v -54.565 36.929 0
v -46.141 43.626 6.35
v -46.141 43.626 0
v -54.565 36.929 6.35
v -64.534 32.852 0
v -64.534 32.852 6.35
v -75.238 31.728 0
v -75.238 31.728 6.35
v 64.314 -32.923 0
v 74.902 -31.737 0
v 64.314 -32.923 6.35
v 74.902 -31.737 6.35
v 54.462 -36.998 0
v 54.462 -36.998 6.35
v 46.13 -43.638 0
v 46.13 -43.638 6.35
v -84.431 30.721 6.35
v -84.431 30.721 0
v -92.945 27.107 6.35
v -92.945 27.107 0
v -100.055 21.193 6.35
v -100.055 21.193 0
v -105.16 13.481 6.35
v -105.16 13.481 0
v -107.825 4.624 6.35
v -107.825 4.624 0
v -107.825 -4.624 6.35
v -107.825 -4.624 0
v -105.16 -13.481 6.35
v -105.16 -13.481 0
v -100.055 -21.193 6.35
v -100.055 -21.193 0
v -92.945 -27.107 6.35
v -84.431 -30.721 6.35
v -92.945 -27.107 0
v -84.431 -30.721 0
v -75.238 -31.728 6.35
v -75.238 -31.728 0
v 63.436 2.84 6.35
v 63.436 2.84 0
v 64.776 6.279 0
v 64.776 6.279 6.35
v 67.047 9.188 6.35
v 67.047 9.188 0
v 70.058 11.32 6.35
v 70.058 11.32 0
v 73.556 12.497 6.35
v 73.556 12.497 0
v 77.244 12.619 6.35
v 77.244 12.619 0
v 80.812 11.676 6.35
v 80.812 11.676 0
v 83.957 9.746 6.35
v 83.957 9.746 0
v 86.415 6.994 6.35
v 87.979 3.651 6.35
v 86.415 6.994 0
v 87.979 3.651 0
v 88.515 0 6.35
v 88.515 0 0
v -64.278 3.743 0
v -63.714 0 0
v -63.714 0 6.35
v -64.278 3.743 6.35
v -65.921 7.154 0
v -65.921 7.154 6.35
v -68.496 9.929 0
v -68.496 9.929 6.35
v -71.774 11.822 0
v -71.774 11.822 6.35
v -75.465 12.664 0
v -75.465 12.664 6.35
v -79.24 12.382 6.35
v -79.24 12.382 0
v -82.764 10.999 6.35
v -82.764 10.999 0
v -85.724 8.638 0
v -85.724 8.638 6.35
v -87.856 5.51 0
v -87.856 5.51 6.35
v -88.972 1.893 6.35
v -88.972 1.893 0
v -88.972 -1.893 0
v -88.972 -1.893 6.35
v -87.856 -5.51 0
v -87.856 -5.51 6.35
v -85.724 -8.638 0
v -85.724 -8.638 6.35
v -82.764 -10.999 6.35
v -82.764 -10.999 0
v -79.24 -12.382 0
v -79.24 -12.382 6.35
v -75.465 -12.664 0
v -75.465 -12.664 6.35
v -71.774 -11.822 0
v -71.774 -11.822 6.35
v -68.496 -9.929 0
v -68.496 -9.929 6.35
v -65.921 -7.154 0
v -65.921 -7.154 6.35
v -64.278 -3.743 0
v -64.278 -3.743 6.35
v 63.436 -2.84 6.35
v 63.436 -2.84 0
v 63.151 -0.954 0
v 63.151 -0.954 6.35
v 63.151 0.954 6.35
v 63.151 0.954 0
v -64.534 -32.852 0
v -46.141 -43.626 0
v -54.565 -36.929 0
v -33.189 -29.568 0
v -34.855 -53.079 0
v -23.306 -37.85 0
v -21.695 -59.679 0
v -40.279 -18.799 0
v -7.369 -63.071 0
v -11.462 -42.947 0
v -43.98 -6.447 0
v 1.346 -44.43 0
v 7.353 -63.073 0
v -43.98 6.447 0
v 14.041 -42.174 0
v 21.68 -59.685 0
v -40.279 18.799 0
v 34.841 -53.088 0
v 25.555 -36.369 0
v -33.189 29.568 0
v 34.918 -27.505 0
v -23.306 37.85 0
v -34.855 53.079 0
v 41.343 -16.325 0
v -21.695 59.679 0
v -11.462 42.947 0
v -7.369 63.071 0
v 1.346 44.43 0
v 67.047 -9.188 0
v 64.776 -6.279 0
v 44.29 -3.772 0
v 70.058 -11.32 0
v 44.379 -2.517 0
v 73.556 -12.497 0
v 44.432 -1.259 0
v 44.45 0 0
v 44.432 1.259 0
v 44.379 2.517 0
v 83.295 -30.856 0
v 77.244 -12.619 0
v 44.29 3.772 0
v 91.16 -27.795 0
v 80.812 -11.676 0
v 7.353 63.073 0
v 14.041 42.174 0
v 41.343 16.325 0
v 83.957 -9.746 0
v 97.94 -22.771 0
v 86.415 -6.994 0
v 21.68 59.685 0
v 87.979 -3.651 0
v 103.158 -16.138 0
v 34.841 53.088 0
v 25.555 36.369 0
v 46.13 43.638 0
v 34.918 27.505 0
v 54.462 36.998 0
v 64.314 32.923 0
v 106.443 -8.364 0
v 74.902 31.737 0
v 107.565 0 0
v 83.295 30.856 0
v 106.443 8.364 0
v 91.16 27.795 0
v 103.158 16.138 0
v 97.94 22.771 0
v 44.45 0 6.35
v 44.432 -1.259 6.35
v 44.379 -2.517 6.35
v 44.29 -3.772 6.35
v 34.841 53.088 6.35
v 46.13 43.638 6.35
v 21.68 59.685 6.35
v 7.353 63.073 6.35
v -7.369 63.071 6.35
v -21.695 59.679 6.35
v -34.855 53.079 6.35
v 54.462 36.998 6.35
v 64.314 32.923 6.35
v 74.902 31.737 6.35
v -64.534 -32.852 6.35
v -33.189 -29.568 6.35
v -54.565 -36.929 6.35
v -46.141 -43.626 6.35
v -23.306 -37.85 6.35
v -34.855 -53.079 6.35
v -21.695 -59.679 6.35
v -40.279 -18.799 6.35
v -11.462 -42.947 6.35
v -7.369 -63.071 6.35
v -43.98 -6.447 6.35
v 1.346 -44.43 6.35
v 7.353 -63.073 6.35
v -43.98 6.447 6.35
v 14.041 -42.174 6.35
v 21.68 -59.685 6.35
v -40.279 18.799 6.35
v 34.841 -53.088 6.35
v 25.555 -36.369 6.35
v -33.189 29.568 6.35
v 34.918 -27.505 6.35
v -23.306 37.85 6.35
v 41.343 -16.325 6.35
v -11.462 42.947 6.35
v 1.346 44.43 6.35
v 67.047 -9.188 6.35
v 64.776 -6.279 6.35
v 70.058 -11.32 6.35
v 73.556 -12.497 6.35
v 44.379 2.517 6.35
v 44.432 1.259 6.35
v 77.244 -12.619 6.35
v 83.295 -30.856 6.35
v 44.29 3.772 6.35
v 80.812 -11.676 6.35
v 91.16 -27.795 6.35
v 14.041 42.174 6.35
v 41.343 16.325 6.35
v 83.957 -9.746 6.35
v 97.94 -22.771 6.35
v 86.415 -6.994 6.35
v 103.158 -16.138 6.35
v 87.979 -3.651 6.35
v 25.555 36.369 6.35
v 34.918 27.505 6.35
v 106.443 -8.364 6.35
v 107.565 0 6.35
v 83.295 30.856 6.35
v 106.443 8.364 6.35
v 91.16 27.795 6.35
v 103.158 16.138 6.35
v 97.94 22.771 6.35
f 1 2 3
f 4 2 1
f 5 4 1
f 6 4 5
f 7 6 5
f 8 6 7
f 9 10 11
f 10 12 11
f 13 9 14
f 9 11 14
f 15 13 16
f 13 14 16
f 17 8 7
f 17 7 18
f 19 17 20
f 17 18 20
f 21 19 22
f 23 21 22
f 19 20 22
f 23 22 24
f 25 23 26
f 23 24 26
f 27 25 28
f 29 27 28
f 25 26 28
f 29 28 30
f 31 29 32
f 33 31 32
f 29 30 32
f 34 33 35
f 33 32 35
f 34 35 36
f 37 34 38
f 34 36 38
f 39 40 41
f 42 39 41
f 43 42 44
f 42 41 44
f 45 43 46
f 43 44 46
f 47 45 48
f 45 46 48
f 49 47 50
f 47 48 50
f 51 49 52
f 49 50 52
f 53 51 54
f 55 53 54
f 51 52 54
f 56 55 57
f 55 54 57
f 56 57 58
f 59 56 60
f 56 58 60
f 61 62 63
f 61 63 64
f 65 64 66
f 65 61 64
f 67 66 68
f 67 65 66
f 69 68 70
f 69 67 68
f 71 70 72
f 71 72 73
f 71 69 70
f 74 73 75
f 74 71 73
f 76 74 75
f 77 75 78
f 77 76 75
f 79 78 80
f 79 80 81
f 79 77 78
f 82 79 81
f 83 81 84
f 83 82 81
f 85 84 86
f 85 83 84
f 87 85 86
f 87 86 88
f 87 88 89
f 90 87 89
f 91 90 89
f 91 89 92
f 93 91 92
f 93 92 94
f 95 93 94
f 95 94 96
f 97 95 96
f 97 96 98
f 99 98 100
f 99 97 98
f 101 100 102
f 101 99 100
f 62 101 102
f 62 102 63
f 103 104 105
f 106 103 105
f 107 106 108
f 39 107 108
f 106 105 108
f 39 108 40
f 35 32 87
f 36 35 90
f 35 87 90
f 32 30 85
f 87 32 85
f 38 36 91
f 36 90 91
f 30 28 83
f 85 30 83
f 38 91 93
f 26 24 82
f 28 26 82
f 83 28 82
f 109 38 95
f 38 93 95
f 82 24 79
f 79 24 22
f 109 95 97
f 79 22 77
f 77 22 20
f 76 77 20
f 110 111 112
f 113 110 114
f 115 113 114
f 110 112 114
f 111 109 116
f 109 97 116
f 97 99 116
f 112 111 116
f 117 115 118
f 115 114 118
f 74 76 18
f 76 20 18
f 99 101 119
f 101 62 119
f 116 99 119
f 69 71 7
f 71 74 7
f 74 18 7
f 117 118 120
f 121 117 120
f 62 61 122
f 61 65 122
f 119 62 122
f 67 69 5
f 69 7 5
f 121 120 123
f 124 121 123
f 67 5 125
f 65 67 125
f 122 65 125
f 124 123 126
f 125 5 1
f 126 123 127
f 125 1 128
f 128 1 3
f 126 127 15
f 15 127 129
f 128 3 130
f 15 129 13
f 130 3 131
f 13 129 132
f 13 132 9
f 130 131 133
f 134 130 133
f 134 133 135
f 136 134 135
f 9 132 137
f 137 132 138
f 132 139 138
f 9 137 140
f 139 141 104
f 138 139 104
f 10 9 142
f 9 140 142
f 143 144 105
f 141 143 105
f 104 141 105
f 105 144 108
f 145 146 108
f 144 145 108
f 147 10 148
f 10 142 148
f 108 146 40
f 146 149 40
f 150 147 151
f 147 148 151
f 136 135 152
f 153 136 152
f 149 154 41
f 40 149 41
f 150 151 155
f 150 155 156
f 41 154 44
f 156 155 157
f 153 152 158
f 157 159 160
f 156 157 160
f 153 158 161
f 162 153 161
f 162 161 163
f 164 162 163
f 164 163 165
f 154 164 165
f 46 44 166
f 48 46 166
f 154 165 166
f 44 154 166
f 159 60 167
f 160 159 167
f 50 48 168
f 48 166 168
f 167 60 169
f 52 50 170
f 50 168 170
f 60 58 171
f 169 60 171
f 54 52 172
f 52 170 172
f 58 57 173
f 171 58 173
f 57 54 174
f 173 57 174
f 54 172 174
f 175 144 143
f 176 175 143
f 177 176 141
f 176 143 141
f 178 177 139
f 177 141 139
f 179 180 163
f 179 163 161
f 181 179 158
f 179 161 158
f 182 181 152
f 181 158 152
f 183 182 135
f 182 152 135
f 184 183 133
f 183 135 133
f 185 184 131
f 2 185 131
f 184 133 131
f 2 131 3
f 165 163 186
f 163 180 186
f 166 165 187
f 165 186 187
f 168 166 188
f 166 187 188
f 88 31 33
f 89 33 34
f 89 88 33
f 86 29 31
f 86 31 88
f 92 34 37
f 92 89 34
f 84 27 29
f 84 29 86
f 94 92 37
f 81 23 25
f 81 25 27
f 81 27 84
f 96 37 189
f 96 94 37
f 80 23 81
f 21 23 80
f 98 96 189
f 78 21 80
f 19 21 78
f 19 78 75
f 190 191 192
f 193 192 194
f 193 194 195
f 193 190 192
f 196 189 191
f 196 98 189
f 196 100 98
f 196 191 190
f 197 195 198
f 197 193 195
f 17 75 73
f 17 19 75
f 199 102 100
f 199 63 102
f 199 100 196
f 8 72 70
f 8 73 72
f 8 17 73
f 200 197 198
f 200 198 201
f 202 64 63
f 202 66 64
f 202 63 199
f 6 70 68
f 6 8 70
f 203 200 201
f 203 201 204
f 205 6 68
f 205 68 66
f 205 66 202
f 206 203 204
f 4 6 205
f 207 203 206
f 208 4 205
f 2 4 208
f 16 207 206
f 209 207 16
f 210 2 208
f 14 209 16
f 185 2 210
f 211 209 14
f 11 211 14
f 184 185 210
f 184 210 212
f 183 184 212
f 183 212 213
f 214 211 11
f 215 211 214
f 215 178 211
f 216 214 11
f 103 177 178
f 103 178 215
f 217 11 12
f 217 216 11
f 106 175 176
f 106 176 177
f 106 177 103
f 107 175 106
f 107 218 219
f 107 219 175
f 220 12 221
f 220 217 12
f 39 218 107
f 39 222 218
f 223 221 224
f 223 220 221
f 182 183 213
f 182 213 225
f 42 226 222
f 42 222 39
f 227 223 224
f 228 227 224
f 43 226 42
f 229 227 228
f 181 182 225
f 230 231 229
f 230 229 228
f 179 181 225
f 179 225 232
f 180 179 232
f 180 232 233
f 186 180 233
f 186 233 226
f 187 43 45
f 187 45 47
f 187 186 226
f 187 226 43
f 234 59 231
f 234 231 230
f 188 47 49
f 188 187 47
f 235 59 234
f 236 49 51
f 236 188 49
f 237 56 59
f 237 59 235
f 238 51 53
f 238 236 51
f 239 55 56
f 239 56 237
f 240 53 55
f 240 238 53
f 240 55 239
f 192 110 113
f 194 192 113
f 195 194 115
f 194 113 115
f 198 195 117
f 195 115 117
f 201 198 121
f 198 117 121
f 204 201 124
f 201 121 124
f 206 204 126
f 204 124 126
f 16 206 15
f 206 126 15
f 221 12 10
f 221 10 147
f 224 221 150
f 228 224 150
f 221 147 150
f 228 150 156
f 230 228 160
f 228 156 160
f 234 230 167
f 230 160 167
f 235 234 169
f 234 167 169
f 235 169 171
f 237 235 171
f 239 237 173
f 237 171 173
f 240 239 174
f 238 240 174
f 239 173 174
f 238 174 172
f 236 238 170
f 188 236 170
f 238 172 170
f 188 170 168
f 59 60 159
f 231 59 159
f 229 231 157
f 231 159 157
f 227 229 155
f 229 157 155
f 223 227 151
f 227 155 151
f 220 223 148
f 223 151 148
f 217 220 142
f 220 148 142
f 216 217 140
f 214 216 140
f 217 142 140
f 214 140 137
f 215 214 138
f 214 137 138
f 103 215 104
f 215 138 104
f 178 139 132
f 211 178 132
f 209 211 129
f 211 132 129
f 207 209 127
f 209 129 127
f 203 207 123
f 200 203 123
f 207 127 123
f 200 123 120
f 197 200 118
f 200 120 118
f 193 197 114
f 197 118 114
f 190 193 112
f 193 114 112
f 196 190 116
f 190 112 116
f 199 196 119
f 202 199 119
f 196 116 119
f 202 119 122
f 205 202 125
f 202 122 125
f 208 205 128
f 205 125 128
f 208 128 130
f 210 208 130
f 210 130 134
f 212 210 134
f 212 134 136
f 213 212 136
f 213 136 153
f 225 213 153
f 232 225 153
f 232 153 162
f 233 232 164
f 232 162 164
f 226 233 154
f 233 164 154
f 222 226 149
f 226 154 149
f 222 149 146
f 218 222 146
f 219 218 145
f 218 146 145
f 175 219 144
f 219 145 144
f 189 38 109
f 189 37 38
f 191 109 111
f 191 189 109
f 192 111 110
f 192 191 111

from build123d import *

# Parameters (mm, degrees)
F0_R     = 12.7
F1_DEPTH = 6.35
F2_R     = 38.1


# Not quite as in the source:
# - a length typed as a fraction of an inch, garbled in the dataset ("3 / 203.2 mm" for 3/8 in), is restored


with BuildPart() as f1:
    # F0 (on Top) → F1 (new body)
    with BuildSketch(Plane.XY):
        with BuildLine():
            ThreePointArc((44.2896283804, 3.7724419046), (44.4098889973, 1.8879245867), (44.45, 0))
            ThreePointArc((44.45, 0), (44.4098889973, -1.8879245867), (44.2896283804, -3.7724419046))
            ThreePointArc((44.2896283804, -3.7724419046), (48.6524538165, -16.4400117074), (57.8519523886, -26.1801757984))
            ThreePointArc((57.8519523886, -26.1801757983), (61.7568132692, -14.7765359551), (63.4364387448, -2.8404646402))
            ThreePointArc((63.4364387448, -2.8404646402), (63.1147165179, 0), (63.4364387448, 2.8404646402))
            ThreePointArc((63.4364387448, 2.8404646402), (61.7568132692, 14.7765359551), (57.8519523886, 26.1801757983))
            ThreePointArc((57.8519523886, 26.1801757984), (48.6524538165, 16.4400117074), (44.2896283804, 3.7724419046))
        make_face()
        with BuildLine():
            ThreePointArc((44.2896283804, -3.7724419046), (-44.45, 0), (44.2896283804, 3.7724419046))
            ThreePointArc((44.2896283804, 3.7724419046), (48.6524538165, 16.4400117074), (57.8519523886, 26.1801757984))
            ThreePointArc((57.8519523886, 26.1801757983), (-0.1747733497, 63.499759482), (-57.9951886366, 25.8613243088))
            ThreePointArc((-57.9951886366, 25.8613243088), (-48.1929456979, 14.5475718573), (-44.6640486717, 0))
            ThreePointArc((-44.6640486717, 0), (-48.1929456979, -14.5475718573), (-57.9951886366, -25.8613243088))
            ThreePointArc((-57.9951886366, -25.8613243088), (-0.1747733497, -63.499759482), (57.8519523886, -26.1801757983))
            ThreePointArc((57.8519523886, -26.1801757984), (48.6524538165, -16.4400117074), (44.2896283804, -3.7724419046))
        make_face()
        with BuildLine():
            ThreePointArc((107.5647165179, 0), (90.6090522396, 28.09252802), (57.8519523886, 26.1801757984))
            ThreePointArc((57.8519523886, 26.1801757983), (61.7568132692, 14.7765359551), (63.4364387448, 2.8404646402))
            ThreePointArc((63.4364387448, 2.8404646402), (77.244029689, 12.6193131294), (88.5147165179, 0))
            ThreePointArc((88.5147165179, 0), (77.244029689, -12.6193131294), (63.4364387448, -2.8404646402))
            ThreePointArc((63.4364387448, -2.8404646402), (61.7568132692, -14.7765359551), (57.8519523886, -26.1801757983))
            ThreePointArc((57.8519523886, -26.1801757984), (90.6090522396, -28.09252802), (107.5647165179, 0))
        make_face()
        with BuildLine():
            ThreePointArc((-44.6640486717, 0), (-48.1929456979, 14.5475718573), (-57.9951886366, 25.8613243088))
            ThreePointArc((-57.9951886366, 25.8613243088), (-63.5, 0), (-57.9951886366, -25.8613243088))
            ThreePointArc((-57.9951886366, -25.8613243088), (-48.1929456979, -14.5475718573), (-44.6640486717, 0))
        make_face()
        with BuildLine():
            ThreePointArc((-57.9951886366, -25.8613243088), (-63.5, 0), (-57.9951886366, 25.8613243088))
            ThreePointArc((-57.9951886366, 25.8613243088), (-108.1640486717, 0), (-57.9951886366, -25.8613243088))
        make_face()
        with Locations((-76.4140486717, 0)):
            Circle(F0_R, mode=Mode.SUBTRACT)
    extrude(amount=F1_DEPTH)

    # F2
    f2_edges = [f1.edges().sort_by_distance(p)[0] for p in [
        (-57.995189, 25.861324, 3.175),
        (57.851952, 26.180176, 3.175),
        (-57.995189, -25.861324, 3.175),
        (57.851952, -26.180176, 3.175),
    ]]
    fillet(f2_edges, radius=F2_R)


solid = f1.part
